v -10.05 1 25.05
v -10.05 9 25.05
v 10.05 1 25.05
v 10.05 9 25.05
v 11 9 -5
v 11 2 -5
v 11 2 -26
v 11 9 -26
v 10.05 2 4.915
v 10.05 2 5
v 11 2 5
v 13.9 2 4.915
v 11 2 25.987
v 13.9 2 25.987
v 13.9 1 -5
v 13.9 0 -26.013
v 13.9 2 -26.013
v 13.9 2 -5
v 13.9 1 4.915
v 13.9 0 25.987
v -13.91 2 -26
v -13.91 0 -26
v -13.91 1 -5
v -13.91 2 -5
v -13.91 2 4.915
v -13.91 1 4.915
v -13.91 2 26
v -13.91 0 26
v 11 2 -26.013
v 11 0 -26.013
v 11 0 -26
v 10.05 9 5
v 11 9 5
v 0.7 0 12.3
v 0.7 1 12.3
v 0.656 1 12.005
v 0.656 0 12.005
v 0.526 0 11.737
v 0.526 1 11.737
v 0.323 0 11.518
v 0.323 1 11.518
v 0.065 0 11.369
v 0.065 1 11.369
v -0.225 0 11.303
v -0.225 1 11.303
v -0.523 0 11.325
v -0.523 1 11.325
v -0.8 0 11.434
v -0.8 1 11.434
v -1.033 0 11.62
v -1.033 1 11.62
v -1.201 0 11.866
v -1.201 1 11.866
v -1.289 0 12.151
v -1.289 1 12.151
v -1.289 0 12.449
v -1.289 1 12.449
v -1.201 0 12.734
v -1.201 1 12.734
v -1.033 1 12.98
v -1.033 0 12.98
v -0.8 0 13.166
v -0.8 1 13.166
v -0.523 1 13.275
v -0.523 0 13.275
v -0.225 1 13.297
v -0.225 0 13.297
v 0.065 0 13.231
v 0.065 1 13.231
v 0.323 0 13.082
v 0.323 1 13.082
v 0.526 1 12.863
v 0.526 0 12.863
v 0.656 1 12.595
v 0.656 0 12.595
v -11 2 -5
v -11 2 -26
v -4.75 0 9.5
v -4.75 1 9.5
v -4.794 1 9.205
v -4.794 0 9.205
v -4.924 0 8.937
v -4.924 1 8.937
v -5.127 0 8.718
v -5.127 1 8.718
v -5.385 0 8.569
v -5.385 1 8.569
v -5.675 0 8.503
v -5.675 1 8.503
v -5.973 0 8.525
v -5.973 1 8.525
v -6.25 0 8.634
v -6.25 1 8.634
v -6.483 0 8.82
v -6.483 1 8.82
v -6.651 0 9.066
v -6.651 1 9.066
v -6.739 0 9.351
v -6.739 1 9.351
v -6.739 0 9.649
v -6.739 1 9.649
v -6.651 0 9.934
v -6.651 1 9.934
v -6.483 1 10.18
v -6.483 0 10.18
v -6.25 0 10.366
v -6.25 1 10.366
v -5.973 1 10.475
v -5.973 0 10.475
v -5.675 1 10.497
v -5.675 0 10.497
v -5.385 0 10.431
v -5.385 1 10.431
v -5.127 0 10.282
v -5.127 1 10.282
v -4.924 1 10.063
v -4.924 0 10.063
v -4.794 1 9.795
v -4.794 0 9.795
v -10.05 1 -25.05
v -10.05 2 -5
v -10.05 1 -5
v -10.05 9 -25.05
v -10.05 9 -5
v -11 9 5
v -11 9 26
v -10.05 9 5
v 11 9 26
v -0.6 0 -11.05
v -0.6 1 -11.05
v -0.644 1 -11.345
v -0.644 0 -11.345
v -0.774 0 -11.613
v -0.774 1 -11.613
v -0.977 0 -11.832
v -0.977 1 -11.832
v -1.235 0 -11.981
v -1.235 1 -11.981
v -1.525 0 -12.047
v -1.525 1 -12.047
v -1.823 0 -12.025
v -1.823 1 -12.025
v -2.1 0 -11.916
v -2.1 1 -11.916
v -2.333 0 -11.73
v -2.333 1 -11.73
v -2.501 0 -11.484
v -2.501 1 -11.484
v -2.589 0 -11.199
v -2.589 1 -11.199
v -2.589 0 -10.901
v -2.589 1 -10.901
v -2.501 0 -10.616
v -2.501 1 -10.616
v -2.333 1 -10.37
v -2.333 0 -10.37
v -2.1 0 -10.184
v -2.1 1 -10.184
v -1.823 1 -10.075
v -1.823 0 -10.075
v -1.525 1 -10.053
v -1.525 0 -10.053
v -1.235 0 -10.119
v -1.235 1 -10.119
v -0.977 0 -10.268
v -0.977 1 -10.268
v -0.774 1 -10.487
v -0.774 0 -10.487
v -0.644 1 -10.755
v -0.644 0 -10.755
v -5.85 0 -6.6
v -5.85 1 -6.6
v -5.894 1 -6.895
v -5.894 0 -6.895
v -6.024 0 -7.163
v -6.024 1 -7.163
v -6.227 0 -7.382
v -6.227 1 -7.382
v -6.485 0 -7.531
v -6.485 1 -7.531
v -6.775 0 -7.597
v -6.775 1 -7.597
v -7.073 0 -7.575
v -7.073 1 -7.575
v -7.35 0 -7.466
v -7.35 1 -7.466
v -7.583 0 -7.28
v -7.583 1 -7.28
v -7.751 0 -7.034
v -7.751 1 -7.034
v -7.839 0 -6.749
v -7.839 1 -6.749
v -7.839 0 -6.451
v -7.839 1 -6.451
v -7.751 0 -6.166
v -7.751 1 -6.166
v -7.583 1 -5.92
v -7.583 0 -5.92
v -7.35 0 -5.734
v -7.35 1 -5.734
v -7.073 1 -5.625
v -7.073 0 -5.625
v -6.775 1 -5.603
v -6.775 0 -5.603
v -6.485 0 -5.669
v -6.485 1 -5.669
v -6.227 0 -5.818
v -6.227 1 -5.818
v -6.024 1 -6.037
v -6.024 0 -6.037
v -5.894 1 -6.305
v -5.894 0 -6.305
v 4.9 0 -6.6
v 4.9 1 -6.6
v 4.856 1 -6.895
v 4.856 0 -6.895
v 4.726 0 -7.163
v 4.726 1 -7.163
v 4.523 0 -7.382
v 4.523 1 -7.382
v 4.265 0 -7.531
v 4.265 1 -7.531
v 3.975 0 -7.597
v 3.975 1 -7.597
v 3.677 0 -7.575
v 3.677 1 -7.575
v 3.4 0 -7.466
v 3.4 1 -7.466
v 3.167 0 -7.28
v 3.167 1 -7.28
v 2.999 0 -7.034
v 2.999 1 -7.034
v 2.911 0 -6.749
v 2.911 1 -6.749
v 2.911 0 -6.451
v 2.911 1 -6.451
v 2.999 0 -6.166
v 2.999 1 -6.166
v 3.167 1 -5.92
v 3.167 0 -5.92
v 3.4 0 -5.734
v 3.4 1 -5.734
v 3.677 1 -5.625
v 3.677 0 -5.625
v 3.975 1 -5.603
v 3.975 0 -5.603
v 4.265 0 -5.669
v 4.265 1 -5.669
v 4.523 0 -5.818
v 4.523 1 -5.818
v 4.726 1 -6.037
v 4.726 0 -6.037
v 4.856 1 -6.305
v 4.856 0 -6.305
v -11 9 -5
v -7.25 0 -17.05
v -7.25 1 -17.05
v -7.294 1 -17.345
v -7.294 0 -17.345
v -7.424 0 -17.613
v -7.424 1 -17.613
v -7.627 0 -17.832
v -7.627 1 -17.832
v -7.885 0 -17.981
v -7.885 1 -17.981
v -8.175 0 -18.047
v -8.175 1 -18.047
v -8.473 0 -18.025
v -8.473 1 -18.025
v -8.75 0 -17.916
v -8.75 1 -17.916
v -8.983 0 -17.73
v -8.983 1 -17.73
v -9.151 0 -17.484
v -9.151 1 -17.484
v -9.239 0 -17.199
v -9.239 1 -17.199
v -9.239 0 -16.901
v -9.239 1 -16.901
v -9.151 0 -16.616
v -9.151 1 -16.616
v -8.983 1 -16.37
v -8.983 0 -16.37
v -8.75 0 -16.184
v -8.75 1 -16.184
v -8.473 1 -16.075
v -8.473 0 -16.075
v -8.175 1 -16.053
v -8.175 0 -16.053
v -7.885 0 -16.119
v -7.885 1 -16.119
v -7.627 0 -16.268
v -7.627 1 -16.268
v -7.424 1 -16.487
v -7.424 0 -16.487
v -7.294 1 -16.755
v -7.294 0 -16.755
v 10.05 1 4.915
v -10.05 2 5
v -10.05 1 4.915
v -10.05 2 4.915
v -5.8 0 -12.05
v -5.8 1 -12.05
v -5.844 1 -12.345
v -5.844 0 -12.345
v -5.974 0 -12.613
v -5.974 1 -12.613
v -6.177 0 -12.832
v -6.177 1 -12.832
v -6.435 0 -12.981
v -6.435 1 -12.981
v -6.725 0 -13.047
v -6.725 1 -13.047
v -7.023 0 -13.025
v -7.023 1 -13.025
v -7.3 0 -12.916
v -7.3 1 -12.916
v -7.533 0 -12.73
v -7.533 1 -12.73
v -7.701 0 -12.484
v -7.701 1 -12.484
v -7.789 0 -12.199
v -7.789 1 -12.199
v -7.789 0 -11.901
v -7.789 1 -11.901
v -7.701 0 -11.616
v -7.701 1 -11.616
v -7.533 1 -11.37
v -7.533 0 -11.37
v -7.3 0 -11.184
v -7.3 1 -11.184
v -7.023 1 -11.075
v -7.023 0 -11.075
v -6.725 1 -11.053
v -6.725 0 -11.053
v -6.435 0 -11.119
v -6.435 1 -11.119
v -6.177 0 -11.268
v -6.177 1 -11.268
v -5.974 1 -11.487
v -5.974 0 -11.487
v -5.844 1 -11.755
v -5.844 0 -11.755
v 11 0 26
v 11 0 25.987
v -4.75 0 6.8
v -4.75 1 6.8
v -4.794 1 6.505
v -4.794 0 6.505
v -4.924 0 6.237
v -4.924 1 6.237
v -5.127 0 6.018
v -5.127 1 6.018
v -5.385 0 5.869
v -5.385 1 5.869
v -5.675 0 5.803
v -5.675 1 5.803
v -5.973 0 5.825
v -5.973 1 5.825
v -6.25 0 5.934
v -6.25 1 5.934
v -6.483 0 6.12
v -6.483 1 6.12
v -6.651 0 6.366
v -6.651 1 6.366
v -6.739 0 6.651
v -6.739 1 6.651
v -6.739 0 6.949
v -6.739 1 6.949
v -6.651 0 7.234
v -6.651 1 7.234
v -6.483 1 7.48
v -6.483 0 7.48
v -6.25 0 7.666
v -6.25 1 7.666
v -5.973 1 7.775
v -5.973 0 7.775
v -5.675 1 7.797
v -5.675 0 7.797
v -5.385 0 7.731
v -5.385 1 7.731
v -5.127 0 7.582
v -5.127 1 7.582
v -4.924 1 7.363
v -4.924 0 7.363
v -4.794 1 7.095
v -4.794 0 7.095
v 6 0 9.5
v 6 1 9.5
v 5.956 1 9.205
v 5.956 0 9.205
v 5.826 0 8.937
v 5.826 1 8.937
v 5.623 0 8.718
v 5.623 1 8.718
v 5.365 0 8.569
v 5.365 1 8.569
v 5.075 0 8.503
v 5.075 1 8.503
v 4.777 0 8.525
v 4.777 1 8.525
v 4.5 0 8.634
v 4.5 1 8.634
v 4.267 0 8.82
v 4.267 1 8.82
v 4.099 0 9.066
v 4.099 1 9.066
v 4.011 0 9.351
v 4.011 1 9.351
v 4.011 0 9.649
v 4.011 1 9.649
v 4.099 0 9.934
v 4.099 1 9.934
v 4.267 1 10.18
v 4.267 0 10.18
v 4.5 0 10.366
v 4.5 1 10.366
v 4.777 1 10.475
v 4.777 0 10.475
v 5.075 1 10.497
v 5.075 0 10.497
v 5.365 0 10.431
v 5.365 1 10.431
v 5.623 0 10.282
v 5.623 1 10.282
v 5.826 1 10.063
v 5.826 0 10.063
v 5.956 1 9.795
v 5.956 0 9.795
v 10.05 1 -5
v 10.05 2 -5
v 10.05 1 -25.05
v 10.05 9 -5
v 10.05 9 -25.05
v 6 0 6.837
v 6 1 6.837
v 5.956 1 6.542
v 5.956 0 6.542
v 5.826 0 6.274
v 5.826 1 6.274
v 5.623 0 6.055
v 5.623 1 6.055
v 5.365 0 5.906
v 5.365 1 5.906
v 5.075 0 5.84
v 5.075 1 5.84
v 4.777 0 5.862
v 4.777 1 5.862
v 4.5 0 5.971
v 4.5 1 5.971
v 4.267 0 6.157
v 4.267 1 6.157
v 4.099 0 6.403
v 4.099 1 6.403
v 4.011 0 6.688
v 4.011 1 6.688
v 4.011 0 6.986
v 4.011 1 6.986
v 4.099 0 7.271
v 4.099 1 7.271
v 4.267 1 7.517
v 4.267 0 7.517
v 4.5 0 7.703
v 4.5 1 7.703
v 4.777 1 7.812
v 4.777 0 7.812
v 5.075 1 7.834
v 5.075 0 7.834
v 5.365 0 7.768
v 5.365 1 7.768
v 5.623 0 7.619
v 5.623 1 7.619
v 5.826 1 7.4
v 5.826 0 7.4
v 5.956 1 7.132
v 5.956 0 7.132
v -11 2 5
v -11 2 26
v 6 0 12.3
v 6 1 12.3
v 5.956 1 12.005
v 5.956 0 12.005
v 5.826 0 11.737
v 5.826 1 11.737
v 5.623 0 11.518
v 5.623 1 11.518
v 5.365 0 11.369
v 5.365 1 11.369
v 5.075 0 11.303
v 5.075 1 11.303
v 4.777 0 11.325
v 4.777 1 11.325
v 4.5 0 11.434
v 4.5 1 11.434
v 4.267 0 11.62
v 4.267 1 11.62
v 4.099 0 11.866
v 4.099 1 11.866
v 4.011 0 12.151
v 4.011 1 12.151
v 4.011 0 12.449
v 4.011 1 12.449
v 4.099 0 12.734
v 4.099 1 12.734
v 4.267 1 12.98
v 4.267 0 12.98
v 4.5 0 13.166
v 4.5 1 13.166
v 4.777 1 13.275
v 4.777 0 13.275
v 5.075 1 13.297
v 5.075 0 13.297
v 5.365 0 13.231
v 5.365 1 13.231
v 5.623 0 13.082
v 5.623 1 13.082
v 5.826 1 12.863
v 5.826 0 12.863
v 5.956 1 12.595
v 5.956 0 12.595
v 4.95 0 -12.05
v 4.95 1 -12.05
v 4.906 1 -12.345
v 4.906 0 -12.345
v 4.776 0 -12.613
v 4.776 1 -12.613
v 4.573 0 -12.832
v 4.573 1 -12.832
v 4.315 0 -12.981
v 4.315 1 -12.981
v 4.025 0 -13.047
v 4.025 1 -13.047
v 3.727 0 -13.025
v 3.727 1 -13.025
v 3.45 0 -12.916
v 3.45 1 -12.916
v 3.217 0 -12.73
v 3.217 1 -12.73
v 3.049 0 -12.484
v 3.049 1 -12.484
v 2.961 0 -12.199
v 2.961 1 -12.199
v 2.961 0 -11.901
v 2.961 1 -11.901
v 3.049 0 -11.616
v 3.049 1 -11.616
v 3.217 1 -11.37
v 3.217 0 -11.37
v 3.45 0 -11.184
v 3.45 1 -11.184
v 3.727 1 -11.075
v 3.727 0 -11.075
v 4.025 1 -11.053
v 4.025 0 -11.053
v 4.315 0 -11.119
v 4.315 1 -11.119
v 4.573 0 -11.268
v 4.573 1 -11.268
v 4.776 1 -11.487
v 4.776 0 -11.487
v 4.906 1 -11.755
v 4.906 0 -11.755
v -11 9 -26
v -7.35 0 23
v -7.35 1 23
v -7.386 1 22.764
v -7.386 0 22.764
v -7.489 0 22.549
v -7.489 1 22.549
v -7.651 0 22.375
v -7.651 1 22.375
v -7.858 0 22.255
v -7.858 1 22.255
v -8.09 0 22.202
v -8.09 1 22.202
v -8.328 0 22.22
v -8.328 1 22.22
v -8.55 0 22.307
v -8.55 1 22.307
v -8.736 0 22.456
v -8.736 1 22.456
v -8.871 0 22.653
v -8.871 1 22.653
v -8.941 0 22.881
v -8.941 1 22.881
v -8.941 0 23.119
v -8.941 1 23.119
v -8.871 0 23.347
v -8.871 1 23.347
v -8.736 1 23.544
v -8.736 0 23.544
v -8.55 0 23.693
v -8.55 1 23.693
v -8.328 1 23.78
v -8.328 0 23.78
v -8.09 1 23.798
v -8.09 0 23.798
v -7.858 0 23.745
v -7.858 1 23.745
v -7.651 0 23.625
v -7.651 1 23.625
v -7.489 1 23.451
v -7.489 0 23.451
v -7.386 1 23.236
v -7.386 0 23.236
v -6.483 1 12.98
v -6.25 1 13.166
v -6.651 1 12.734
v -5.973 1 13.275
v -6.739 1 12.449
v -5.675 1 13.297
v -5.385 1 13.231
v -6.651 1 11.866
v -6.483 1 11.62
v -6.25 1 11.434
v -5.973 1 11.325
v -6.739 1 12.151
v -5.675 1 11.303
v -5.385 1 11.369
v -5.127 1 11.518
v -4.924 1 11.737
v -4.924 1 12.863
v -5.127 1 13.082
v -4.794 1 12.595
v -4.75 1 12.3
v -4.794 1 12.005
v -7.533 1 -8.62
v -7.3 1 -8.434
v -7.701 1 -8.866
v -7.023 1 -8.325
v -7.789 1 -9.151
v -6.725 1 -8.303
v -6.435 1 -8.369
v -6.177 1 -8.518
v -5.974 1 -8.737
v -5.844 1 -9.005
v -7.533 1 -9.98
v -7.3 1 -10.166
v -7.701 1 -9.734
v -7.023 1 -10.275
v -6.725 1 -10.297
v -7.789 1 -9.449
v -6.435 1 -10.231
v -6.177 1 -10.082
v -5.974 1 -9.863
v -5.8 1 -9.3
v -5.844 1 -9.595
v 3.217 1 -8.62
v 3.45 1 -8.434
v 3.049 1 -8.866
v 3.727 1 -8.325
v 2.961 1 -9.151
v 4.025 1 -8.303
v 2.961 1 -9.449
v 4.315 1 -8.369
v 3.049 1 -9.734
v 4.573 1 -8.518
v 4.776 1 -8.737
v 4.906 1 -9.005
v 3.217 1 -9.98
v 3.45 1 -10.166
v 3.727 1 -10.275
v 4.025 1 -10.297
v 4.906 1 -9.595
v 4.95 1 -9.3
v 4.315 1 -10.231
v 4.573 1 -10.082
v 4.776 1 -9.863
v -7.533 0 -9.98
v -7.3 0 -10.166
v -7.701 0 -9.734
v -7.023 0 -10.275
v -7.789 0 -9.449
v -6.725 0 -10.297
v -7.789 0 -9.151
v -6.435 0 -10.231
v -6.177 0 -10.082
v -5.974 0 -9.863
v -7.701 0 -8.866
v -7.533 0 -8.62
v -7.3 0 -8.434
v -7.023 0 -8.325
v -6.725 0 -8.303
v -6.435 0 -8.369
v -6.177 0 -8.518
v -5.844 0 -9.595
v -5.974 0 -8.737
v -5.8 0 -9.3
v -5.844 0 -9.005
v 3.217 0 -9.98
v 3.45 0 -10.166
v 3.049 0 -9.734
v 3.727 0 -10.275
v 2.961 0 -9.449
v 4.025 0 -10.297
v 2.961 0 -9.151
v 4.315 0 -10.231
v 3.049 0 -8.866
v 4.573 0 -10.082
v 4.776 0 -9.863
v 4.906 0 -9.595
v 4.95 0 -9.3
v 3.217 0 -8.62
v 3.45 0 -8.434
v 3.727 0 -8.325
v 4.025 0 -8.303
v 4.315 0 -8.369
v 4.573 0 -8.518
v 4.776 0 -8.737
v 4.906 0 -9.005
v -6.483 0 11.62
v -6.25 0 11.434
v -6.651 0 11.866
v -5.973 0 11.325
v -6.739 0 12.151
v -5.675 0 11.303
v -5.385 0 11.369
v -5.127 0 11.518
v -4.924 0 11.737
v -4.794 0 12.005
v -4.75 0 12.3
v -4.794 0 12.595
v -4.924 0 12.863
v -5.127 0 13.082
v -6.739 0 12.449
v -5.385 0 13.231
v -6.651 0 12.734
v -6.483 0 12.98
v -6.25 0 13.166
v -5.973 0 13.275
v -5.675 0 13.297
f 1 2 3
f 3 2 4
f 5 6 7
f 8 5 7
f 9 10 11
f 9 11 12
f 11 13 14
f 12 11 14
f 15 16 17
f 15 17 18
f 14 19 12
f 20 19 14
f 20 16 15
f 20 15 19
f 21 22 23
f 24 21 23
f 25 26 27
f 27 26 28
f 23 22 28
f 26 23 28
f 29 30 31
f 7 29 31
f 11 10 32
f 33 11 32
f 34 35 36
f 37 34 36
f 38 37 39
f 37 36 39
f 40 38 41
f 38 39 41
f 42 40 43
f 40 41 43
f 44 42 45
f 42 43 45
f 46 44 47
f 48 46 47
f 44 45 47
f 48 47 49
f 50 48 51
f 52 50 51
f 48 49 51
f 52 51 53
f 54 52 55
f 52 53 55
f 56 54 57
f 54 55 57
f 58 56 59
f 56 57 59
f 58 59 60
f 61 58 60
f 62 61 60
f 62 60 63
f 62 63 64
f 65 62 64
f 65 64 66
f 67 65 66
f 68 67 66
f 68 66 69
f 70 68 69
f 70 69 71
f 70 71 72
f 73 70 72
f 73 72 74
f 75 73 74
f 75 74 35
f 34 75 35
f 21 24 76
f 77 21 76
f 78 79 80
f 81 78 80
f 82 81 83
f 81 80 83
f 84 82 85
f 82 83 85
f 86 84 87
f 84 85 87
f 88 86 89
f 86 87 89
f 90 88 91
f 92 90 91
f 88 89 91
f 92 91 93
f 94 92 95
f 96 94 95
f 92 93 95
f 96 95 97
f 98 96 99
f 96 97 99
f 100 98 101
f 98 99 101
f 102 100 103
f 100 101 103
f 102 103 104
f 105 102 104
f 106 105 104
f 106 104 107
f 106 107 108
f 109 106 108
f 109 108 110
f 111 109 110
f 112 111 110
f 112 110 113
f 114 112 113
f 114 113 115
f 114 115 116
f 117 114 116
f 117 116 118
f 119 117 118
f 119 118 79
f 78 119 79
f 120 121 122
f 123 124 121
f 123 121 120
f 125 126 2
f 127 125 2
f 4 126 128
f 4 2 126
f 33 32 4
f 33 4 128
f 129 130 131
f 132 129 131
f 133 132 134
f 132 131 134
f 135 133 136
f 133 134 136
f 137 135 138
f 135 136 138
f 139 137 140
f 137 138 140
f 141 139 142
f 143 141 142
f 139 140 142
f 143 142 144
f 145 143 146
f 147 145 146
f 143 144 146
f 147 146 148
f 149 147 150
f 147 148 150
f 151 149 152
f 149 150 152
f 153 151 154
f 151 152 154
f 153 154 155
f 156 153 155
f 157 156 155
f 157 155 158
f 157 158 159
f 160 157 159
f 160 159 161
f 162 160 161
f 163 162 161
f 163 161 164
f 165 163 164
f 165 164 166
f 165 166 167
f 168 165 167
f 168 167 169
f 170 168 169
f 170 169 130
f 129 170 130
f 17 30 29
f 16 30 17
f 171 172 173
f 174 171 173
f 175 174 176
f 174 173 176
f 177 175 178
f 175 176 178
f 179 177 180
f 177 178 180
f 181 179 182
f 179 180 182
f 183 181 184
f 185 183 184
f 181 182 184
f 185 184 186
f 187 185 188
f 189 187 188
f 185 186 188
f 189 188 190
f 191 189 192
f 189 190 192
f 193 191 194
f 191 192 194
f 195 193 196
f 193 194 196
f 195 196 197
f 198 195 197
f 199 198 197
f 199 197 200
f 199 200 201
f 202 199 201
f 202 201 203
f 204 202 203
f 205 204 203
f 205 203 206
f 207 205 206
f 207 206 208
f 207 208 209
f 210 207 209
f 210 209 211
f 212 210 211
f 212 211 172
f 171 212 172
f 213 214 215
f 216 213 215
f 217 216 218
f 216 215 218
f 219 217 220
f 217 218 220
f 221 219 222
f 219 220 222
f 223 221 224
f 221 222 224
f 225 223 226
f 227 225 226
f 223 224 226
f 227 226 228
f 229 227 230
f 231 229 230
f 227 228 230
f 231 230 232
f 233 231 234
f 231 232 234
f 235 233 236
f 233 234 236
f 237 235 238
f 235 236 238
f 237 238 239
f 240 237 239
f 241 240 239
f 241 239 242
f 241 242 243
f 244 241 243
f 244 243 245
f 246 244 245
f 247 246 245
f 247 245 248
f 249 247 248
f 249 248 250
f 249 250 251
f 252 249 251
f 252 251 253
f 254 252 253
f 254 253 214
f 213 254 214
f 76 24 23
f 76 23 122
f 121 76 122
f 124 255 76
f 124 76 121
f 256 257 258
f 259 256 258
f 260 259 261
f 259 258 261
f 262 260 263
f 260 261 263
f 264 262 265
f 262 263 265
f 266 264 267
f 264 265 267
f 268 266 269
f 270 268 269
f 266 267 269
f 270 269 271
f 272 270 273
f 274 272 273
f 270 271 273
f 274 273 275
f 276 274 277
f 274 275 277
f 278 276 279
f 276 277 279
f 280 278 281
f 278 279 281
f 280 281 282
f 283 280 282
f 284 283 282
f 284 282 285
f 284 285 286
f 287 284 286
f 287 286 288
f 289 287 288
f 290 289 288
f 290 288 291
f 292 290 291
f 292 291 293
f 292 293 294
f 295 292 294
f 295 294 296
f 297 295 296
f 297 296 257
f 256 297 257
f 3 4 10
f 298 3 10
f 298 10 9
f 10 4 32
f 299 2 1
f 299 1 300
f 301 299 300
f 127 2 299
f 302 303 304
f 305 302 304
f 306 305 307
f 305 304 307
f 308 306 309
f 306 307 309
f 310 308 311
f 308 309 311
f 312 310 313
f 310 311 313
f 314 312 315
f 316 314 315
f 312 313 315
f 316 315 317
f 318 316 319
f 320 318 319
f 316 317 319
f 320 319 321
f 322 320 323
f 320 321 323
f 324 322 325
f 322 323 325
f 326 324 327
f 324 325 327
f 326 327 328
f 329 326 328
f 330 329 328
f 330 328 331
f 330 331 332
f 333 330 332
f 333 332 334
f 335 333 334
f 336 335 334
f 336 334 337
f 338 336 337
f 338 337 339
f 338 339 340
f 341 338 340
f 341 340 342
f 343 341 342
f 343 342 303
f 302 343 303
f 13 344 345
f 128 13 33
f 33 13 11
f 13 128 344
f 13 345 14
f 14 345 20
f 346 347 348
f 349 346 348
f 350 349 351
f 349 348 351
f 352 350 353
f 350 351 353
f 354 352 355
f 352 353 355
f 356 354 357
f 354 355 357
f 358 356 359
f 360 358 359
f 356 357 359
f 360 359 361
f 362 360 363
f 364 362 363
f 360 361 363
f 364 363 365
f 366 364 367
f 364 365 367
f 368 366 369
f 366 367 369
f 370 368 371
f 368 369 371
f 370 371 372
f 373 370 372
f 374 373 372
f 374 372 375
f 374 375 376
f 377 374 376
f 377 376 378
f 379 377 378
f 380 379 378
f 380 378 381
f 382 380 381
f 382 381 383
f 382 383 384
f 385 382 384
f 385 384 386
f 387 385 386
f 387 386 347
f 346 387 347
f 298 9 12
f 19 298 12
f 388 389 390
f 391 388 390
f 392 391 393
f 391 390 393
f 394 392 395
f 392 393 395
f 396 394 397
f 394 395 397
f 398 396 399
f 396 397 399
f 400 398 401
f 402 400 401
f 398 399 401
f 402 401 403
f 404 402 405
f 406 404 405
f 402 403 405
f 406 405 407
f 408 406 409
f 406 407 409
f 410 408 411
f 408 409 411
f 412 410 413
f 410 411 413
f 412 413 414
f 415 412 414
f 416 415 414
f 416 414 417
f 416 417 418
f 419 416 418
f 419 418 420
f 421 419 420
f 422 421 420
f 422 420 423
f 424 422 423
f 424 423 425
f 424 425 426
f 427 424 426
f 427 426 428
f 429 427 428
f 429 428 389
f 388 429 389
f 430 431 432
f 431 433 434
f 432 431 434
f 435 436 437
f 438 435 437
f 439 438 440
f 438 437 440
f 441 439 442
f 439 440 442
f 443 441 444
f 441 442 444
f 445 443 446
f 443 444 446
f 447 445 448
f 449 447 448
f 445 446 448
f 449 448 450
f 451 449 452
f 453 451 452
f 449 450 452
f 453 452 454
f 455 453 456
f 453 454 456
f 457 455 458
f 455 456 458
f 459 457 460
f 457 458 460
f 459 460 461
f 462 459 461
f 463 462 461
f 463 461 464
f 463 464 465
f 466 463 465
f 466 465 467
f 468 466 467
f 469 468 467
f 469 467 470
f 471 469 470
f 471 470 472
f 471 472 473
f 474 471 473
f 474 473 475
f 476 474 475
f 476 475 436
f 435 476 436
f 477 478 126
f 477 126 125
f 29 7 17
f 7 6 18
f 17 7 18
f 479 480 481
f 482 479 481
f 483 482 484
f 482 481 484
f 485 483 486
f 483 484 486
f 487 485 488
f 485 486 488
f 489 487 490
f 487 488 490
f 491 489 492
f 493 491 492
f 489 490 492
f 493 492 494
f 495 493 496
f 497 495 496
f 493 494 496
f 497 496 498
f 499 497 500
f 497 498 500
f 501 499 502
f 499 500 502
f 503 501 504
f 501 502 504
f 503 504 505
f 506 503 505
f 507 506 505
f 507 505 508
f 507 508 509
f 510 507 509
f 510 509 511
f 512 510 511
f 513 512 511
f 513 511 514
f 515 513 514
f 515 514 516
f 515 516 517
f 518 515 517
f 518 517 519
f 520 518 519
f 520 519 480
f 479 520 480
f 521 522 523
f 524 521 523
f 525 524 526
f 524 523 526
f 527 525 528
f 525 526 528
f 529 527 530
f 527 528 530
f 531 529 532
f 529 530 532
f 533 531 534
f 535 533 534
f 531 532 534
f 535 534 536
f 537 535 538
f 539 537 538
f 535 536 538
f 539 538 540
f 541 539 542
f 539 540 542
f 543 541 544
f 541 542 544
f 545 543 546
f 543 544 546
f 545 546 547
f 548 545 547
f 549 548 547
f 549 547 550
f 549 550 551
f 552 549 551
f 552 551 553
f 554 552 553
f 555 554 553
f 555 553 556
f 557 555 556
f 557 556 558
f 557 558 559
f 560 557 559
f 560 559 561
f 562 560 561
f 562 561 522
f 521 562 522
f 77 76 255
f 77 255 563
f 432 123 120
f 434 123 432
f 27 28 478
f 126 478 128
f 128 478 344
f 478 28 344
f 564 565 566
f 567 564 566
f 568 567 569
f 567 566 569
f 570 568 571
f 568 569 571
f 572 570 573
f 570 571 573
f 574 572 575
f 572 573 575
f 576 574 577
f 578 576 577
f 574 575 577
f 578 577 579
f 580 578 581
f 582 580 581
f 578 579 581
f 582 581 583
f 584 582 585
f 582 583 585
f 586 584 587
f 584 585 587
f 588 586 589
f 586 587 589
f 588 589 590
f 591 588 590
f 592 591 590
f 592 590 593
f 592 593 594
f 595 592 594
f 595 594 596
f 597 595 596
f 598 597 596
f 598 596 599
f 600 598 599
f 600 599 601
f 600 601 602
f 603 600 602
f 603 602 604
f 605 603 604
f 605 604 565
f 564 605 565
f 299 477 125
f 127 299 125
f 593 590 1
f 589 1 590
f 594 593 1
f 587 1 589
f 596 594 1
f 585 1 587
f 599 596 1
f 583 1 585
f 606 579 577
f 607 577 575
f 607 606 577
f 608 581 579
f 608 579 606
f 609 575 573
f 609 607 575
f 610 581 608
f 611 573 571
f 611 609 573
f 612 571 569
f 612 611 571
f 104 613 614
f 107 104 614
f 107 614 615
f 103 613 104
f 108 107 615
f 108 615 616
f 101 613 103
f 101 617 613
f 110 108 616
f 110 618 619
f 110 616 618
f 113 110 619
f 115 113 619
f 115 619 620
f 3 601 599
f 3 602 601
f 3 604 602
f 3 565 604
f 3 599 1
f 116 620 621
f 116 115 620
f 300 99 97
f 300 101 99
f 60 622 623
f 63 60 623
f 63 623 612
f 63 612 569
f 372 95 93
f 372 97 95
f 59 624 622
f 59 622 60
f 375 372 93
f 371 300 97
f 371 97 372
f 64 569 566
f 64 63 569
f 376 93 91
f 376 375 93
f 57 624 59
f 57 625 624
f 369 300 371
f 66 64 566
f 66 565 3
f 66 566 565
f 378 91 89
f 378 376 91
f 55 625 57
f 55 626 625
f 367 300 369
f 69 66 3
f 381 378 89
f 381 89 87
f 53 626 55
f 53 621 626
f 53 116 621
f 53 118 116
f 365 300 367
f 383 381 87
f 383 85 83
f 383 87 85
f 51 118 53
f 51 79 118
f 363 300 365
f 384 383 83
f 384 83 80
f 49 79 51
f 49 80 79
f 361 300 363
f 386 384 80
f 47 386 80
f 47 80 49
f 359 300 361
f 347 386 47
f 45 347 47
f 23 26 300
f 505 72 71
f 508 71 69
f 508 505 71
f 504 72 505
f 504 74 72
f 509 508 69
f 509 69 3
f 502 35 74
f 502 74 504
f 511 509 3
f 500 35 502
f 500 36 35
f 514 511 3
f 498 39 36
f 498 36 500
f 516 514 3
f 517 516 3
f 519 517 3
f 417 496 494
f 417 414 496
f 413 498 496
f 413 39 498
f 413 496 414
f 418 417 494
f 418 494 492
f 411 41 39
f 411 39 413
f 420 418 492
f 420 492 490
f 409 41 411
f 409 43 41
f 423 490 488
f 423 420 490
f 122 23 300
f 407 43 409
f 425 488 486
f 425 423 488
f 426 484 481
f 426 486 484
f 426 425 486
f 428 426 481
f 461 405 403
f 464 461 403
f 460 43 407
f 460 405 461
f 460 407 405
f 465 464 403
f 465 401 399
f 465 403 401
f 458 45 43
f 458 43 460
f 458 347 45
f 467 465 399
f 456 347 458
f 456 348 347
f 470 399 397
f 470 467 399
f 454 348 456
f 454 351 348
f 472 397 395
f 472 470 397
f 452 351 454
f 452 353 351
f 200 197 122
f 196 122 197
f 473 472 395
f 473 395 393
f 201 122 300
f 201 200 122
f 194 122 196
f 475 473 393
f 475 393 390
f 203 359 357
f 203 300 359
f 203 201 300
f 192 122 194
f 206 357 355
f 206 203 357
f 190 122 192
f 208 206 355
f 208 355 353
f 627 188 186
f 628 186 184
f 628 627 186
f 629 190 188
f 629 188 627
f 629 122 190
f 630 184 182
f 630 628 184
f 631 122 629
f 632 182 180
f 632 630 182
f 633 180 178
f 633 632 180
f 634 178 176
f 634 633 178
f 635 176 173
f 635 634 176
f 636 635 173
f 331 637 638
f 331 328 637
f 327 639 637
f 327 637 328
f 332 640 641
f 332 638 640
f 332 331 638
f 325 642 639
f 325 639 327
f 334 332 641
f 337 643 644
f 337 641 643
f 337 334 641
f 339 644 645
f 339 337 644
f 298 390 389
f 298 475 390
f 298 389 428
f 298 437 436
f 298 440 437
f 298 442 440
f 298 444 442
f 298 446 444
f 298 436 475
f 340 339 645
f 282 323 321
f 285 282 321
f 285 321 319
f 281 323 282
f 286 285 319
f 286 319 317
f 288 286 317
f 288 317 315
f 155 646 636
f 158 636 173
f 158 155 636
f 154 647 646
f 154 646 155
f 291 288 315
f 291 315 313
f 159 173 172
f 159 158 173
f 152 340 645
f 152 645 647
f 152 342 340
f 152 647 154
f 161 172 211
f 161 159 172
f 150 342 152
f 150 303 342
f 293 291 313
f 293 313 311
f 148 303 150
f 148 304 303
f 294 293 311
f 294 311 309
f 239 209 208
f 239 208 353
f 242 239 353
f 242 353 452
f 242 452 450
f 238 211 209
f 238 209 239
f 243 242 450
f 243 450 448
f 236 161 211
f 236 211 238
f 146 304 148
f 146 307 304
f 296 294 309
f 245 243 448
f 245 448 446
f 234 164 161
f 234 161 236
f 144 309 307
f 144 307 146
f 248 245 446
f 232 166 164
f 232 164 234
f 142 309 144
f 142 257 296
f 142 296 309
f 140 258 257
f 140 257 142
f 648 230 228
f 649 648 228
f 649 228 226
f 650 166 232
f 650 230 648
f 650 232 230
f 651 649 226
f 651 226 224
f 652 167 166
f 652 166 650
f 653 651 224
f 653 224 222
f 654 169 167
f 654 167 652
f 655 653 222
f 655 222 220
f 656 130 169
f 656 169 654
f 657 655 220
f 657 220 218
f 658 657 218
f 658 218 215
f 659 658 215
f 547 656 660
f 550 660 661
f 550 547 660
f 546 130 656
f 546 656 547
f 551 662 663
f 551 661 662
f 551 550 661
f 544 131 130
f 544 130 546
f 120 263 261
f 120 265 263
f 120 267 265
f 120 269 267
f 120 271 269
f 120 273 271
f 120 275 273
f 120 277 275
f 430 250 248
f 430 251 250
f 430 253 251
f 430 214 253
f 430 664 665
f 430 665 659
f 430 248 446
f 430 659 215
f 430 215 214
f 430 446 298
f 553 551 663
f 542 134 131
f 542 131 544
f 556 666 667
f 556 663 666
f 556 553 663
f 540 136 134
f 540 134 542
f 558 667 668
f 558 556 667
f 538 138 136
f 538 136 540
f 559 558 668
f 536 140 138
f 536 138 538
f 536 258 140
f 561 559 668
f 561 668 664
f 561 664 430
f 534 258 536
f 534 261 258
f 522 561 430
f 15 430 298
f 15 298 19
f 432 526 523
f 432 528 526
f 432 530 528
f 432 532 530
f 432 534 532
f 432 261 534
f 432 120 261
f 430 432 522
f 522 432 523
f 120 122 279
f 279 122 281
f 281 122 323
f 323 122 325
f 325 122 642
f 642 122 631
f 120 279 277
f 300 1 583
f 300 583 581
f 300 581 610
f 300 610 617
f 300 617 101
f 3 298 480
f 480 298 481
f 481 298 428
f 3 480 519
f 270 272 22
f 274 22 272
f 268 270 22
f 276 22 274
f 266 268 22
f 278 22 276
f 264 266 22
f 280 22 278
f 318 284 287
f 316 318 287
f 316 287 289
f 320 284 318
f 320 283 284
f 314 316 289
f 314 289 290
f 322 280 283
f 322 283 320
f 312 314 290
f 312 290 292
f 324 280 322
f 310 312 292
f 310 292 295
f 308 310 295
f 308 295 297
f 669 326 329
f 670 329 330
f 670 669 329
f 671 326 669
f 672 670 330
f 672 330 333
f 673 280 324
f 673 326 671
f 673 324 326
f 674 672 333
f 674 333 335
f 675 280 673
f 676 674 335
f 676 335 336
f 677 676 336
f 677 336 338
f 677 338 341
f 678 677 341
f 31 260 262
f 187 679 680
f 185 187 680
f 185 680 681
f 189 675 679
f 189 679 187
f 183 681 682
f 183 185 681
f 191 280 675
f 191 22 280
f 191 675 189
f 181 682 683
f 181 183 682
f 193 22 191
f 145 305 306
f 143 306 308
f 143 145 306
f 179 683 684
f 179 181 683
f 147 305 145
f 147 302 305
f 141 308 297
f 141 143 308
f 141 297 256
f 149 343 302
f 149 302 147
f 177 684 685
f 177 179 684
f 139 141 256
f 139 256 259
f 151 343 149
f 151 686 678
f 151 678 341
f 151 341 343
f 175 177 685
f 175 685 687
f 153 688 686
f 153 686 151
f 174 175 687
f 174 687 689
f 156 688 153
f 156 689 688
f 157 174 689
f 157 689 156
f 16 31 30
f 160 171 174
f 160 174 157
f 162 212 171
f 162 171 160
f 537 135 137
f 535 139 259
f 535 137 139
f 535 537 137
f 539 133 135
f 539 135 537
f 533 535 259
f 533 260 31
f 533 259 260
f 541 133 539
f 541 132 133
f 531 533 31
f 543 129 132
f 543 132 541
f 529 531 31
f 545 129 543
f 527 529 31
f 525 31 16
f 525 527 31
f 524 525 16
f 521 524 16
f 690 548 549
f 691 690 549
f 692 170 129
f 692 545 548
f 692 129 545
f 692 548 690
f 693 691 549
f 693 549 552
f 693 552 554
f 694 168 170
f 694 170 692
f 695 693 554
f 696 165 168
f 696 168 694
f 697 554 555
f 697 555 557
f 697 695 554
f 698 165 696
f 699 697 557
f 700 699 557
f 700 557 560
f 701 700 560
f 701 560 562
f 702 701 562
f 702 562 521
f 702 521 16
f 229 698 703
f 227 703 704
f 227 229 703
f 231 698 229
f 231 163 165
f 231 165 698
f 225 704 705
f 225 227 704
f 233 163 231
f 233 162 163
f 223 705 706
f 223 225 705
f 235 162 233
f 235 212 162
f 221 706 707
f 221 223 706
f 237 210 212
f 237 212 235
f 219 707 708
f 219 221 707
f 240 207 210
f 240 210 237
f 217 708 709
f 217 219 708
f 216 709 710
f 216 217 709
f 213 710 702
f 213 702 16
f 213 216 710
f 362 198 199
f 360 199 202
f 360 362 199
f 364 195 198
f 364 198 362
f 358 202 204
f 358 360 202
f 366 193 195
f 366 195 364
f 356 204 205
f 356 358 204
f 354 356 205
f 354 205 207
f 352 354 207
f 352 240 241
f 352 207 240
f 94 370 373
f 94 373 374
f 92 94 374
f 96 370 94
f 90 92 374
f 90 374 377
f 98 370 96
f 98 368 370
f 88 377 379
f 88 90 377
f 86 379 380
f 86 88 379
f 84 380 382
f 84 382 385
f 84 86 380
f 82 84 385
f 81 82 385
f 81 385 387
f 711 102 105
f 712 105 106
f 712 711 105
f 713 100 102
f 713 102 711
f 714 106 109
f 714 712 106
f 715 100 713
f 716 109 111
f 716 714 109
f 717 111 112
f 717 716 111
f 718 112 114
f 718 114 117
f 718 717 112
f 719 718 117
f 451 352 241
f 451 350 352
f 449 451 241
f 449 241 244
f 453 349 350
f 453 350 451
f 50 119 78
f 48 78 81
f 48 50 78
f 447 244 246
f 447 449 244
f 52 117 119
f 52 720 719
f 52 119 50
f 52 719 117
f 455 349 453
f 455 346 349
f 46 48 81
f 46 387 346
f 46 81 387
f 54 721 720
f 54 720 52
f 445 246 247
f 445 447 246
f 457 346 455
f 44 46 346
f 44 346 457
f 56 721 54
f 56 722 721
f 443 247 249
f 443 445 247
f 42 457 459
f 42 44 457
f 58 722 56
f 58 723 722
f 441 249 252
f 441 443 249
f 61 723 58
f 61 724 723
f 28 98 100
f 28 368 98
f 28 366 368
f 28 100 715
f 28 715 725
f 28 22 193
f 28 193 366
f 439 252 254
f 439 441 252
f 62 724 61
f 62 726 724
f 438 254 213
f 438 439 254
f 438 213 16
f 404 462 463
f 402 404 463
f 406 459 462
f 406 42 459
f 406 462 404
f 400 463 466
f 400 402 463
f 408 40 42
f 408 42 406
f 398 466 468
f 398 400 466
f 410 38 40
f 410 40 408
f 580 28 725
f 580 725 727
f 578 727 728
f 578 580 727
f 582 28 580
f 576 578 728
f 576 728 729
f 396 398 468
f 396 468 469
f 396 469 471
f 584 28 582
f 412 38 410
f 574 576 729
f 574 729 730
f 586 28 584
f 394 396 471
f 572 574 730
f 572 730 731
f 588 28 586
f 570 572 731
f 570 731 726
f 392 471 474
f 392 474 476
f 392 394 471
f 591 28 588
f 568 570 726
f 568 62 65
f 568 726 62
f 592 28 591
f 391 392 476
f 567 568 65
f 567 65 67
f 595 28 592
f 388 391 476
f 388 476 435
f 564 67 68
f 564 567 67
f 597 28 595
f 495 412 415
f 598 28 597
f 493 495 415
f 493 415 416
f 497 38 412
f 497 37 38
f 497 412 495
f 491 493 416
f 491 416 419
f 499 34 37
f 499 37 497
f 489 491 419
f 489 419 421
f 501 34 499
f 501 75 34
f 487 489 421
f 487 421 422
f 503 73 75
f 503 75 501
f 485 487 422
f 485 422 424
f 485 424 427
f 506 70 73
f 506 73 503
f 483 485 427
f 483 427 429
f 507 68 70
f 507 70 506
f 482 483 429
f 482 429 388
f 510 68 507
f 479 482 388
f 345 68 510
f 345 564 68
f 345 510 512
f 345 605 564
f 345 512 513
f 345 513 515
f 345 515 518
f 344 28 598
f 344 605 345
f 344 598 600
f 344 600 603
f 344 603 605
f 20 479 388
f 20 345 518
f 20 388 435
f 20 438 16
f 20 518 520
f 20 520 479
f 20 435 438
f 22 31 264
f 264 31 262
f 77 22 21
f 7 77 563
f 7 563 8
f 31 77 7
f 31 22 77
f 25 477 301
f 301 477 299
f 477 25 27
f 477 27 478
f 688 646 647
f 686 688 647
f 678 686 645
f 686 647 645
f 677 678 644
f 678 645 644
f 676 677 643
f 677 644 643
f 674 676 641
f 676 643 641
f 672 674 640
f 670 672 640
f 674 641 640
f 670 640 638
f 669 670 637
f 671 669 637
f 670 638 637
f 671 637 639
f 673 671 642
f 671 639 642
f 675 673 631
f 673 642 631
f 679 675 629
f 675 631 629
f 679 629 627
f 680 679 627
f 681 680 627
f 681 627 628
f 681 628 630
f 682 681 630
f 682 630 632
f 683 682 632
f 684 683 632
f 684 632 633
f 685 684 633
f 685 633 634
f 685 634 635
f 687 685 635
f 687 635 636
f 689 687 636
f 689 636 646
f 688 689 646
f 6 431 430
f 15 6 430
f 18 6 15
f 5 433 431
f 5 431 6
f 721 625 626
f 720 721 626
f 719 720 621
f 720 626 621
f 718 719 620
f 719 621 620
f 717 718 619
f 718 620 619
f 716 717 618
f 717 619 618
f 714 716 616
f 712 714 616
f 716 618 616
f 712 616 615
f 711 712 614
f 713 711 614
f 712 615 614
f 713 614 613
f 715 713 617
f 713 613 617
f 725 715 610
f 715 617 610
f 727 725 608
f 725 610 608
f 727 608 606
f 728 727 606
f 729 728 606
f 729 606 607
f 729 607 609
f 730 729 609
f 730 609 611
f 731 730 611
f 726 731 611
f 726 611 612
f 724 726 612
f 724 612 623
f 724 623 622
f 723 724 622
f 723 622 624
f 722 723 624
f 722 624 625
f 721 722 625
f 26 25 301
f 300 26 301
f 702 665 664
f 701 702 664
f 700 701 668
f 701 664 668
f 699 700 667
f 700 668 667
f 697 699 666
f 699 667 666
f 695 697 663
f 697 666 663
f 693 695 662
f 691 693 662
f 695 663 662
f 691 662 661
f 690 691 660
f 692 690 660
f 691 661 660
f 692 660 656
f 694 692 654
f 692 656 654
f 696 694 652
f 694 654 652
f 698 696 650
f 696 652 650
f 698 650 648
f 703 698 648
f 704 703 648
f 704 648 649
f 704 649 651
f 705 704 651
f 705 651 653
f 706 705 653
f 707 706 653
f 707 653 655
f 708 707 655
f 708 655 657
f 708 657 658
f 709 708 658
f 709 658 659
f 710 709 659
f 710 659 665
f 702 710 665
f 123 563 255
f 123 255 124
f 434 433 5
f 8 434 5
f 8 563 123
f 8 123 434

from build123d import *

# Parameters (mm, degrees)
SKETCH1_W               = 22
SKETCH1_H               = 52
BOSS_EXTRUDE1_DEPTH     = 9
CUT_EXTRUDE1_START      = 2
SKETCH2_W               = 20.1
SKETCH2_H               = 50.1
CUT_EXTRUDE1_DEPTH      = 10
SKETCH7_R               = 0.8
CUT_EXTRUDE6_DEPTH      = 9
CUT_EXTRUDE6_DEPTH_BACK = 2
CUT_EXTRUDE7_REACH      = 3
SKETCH8_R               = 1
CUT_EXTRUDE9_REACH      = 3
SKETCH9_R               = 1
CUT_EXTRUDE10_REACH     = 3
SKETCH10_R              = 1
CUT_EXTRUDE11_REACH     = 3
SKETCH11_R              = 1
CUT_EXTRUDE12_REACH     = 3
SKETCH12_R              = 1
CUT_EXTRUDE13_REACH     = 3
SKETCH13_R              = 1
CUT_EXTRUDE14_REACH     = 3
SKETCH14_R              = 1
CUT_EXTRUDE15_REACH     = 3
SKETCH15_R              = 1
CUT_EXTRUDE16_REACH     = 3
SKETCH16_R              = 1
SKETCH18_W              = 2.91
SKETCH18_H              = 52
BOSS_EXTRUDE2_DEPTH     = 2
SKETCH18_3_W            = 2.9
SKETCH18_3_H            = 52
BOSS_EXTRUDE3_DEPTH     = 2
SKETCH19_W              = 10
SKETCH19_H              = 7
CUT_EXTRUDE17_DEPTH     = 25.9
SKETCH20_W              = 3.86
SKETCH20_H              = 9.915252407
SKETCH20_W_2            = 4.307713093
CUT_EXTRUDE18_DEPTH     = 1


with BuildPart() as part:
    # Sketch1 → Boss-Extrude1 (new body)
    with BuildSketch(Plane(origin=(0, 0, 0), x_dir=(1, 0, 0), z_dir=(0, 1, 0))):
        Rectangle(SKETCH1_W, SKETCH1_H)
    extrude(amount=BOSS_EXTRUDE1_DEPTH)

    # Sketch2 → Cut-Extrude1 (cut)
    with BuildSketch(Plane(origin=(0, 9, 0), x_dir=(1, 0, 0), z_dir=(0, 1, 0)).offset(CUT_EXTRUDE1_START)):
        Rectangle(SKETCH2_W, SKETCH2_H)
    extrude(amount=-CUT_EXTRUDE1_DEPTH, mode=Mode.SUBTRACT)

    # Sketch7 → Cut-Extrude6 (cut, two sides)
    with BuildSketch(Plane(origin=(0, 1, 0), x_dir=(1, 0, 0), z_dir=(0, 1, 0))) as cut_extrude6_sk:
        with Locations((-8.15, -23)):
            Circle(SKETCH7_R)
    extrude(amount=CUT_EXTRUDE6_DEPTH, mode=Mode.SUBTRACT)
    extrude(cut_extrude6_sk.sketch, amount=-CUT_EXTRUDE6_DEPTH_BACK, mode=Mode.SUBTRACT)

    # Sketch8 → Cut-Extrude7 (cut, up to next)
    with BuildSketch(Plane(origin=(0, 1, 0), x_dir=(1, 0, 0), z_dir=(0, 1, 0)), mode=Mode.PRIVATE) as cut_extrude7_sk1:
        with Locations((-5.75, -12.3)):
            Circle(SKETCH8_R)
    cut_extrude7_tool1 = extrude(cut_extrude7_sk1.sketch, amount=-CUT_EXTRUDE7_REACH, mode=Mode.PRIVATE) & part.part
    add(cut_extrude7_tool1.solids().sort_by_distance((-5.75, 1, 12.3))[0], mode=Mode.SUBTRACT)
    # Sketch8 → Cut-Extrude7 (cut, up to next)
    with BuildSketch(Plane(origin=(0, 1, 0), x_dir=(1, 0, 0), z_dir=(0, 1, 0)), mode=Mode.PRIVATE) as cut_extrude7_sk2:
        with Locations((5, -12.3)):
            Circle(SKETCH8_R)
    cut_extrude7_tool2 = extrude(cut_extrude7_sk2.sketch, amount=-CUT_EXTRUDE7_REACH, mode=Mode.PRIVATE) & part.part
    add(cut_extrude7_tool2.solids().sort_by_distance((5, 1, 12.3))[0], mode=Mode.SUBTRACT)

    # Sketch9 → Cut-Extrude9 (cut, up to next)
    with BuildSketch(Plane(origin=(0, 1, 0), x_dir=(1, 0, 0), z_dir=(0, 1, 0)), mode=Mode.PRIVATE) as cut_extrude9_sk1:
        with Locations((-5.75, -9.5)):
            Circle(SKETCH9_R)
    cut_extrude9_tool1 = extrude(cut_extrude9_sk1.sketch, amount=-CUT_EXTRUDE9_REACH, mode=Mode.PRIVATE) & part.part
    add(cut_extrude9_tool1.solids().sort_by_distance((-5.75, 1, 9.5))[0], mode=Mode.SUBTRACT)
    # Sketch9 → Cut-Extrude9 (cut, up to next)
    with BuildSketch(Plane(origin=(0, 1, 0), x_dir=(1, 0, 0), z_dir=(0, 1, 0)), mode=Mode.PRIVATE) as cut_extrude9_sk2:
        with Locations((5, -9.5)):
            Circle(SKETCH9_R)
    cut_extrude9_tool2 = extrude(cut_extrude9_sk2.sketch, amount=-CUT_EXTRUDE9_REACH, mode=Mode.PRIVATE) & part.part
    add(cut_extrude9_tool2.solids().sort_by_distance((5, 1, 9.5))[0], mode=Mode.SUBTRACT)

    # Sketch10 → Cut-Extrude10 (cut, up to next)
    with BuildSketch(Plane(origin=(0, 1, 0), x_dir=(1, 0, 0), z_dir=(0, 1, 0)), mode=Mode.PRIVATE) as cut_extrude10_sk1:
        with Locations((-5.75, -6.8)):
            Circle(SKETCH10_R)
    cut_extrude10_tool1 = extrude(cut_extrude10_sk1.sketch, amount=-CUT_EXTRUDE10_REACH, mode=Mode.PRIVATE) & part.part
    add(cut_extrude10_tool1.solids().sort_by_distance((-5.75, 1, 6.8))[0], mode=Mode.SUBTRACT)
    # Sketch10 → Cut-Extrude10 (cut, up to next)
    with BuildSketch(Plane(origin=(0, 1, 0), x_dir=(1, 0, 0), z_dir=(0, 1, 0)), mode=Mode.PRIVATE) as cut_extrude10_sk2:
        with Locations((5, -6.837159935)):
            Circle(SKETCH10_R)
    cut_extrude10_tool2 = extrude(cut_extrude10_sk2.sketch, amount=-CUT_EXTRUDE10_REACH, mode=Mode.PRIVATE) & part.part
    add(cut_extrude10_tool2.solids().sort_by_distance((5, 1, 6.83716))[0], mode=Mode.SUBTRACT)

    # Sketch11 → Cut-Extrude11 (cut, up to next)
    with BuildSketch(Plane(origin=(0, 1, 0), x_dir=(1, 0, 0), z_dir=(0, 1, 0)), mode=Mode.PRIVATE) as cut_extrude11_sk1:
        with Locations((-0.3, -12.3)):
            Circle(SKETCH11_R)
    cut_extrude11_tool1 = extrude(cut_extrude11_sk1.sketch, amount=-CUT_EXTRUDE11_REACH, mode=Mode.PRIVATE) & part.part
    add(cut_extrude11_tool1.solids().sort_by_distance((-0.3, 1, 12.3))[0], mode=Mode.SUBTRACT)

    # Sketch12 → Cut-Extrude12 (cut, up to next)
    with BuildSketch(Plane(origin=(0, 1, 0), x_dir=(1, 0, 0), z_dir=(0, 1, 0)), mode=Mode.PRIVATE) as cut_extrude12_sk1:
        with Locations((3.95, 12.05)):
            Circle(SKETCH12_R)
    cut_extrude12_tool1 = extrude(cut_extrude12_sk1.sketch, amount=-CUT_EXTRUDE12_REACH, mode=Mode.PRIVATE) & part.part
    add(cut_extrude12_tool1.solids().sort_by_distance((3.95, 1, -12.05))[0], mode=Mode.SUBTRACT)
    # Sketch12 → Cut-Extrude12 (cut, up to next)
    with BuildSketch(Plane(origin=(0, 1, 0), x_dir=(1, 0, 0), z_dir=(0, 1, 0)), mode=Mode.PRIVATE) as cut_extrude12_sk2:
        with Locations((-6.8, 12.05)):
            Circle(SKETCH12_R)
    cut_extrude12_tool2 = extrude(cut_extrude12_sk2.sketch, amount=-CUT_EXTRUDE12_REACH, mode=Mode.PRIVATE) & part.part
    add(cut_extrude12_tool2.solids().sort_by_distance((-6.8, 1, -12.05))[0], mode=Mode.SUBTRACT)

    # Sketch13 → Cut-Extrude13 (cut, up to next)
    with BuildSketch(Plane(origin=(0, 1, 0), x_dir=(1, 0, 0), z_dir=(0, 1, 0)), mode=Mode.PRIVATE) as cut_extrude13_sk1:
        with Locations((3.95, 9.3)):
            Circle(SKETCH13_R)
    cut_extrude13_tool1 = extrude(cut_extrude13_sk1.sketch, amount=-CUT_EXTRUDE13_REACH, mode=Mode.PRIVATE) & part.part
    add(cut_extrude13_tool1.solids().sort_by_distance((3.95, 1, -9.3))[0], mode=Mode.SUBTRACT)
    # Sketch13 → Cut-Extrude13 (cut, up to next)
    with BuildSketch(Plane(origin=(0, 1, 0), x_dir=(1, 0, 0), z_dir=(0, 1, 0)), mode=Mode.PRIVATE) as cut_extrude13_sk2:
        with Locations((-6.8, 9.3)):
            Circle(SKETCH13_R)
    cut_extrude13_tool2 = extrude(cut_extrude13_sk2.sketch, amount=-CUT_EXTRUDE13_REACH, mode=Mode.PRIVATE) & part.part
    add(cut_extrude13_tool2.solids().sort_by_distance((-6.8, 1, -9.3))[0], mode=Mode.SUBTRACT)

    # Sketch14 → Cut-Extrude14 (cut, up to next)
    with BuildSketch(Plane(origin=(0, 1, 0), x_dir=(1, 0, 0), z_dir=(0, 1, 0)), mode=Mode.PRIVATE) as cut_extrude14_sk1:
        with Locations((3.9, 6.6)):
            Circle(SKETCH14_R)
    cut_extrude14_tool1 = extrude(cut_extrude14_sk1.sketch, amount=-CUT_EXTRUDE14_REACH, mode=Mode.PRIVATE) & part.part
    add(cut_extrude14_tool1.solids().sort_by_distance((3.9, 1, -6.6))[0], mode=Mode.SUBTRACT)
    # Sketch14 → Cut-Extrude14 (cut, up to next)
    with BuildSketch(Plane(origin=(0, 1, 0), x_dir=(1, 0, 0), z_dir=(0, 1, 0)), mode=Mode.PRIVATE) as cut_extrude14_sk2:
        with Locations((-6.85, 6.6)):
            Circle(SKETCH14_R)
    cut_extrude14_tool2 = extrude(cut_extrude14_sk2.sketch, amount=-CUT_EXTRUDE14_REACH, mode=Mode.PRIVATE) & part.part
    add(cut_extrude14_tool2.solids().sort_by_distance((-6.85, 1, -6.6))[0], mode=Mode.SUBTRACT)

    # Sketch15 → Cut-Extrude15 (cut, up to next)
    with BuildSketch(Plane(origin=(0, 1, 0), x_dir=(1, 0, 0), z_dir=(0, 1, 0)), mode=Mode.PRIVATE) as cut_extrude15_sk1:
        with Locations((-1.6, 11.05)):
            Circle(SKETCH15_R)
    cut_extrude15_tool1 = extrude(cut_extrude15_sk1.sketch, amount=-CUT_EXTRUDE15_REACH, mode=Mode.PRIVATE) & part.part
    add(cut_extrude15_tool1.solids().sort_by_distance((-1.6, 1, -11.05))[0], mode=Mode.SUBTRACT)

    # Sketch16 → Cut-Extrude16 (cut, up to next)
    with BuildSketch(Plane(origin=(0, 1, 0), x_dir=(1, 0, 0), z_dir=(0, 1, 0)), mode=Mode.PRIVATE) as cut_extrude16_sk1:
        with Locations((-8.25, 17.05)):
            Circle(SKETCH16_R)
    cut_extrude16_tool1 = extrude(cut_extrude16_sk1.sketch, amount=-CUT_EXTRUDE16_REACH, mode=Mode.PRIVATE) & part.part
    add(cut_extrude16_tool1.solids().sort_by_distance((-8.25, 1, -17.05))[0], mode=Mode.SUBTRACT)

    # Sketch18 → Boss-Extrude2 (add)
    with BuildSketch(Plane.XZ):
        with Locations((-12.455, 0)):
            Rectangle(SKETCH18_W, SKETCH18_H)
    extrude(amount=-BOSS_EXTRUDE2_DEPTH)

    # Sketch18<3> → Boss-Extrude3 (add)
    with BuildSketch(Plane.XZ):
        with Locations((12.45, -0.012983648)):
            Rectangle(SKETCH18_3_W, SKETCH18_3_H)
    extrude(amount=-BOSS_EXTRUDE3_DEPTH)

    # Sketch19 → Cut-Extrude17 (cut, through all)
    with BuildSketch(Plane.ZY.offset(11)):
        with Locations((0, 5.5)):
            Rectangle(SKETCH19_W, SKETCH19_H)
    extrude(amount=-CUT_EXTRUDE17_DEPTH, mode=Mode.SUBTRACT)

    # Sketch20 → Cut-Extrude18 (cut)
    with BuildSketch(Plane(origin=(0, 2, 0), x_dir=(1, 0, 0), z_dir=(0, 1, 0))):
        with Locations((-11.98, 0.042373796)):
            Rectangle(SKETCH20_W, SKETCH20_H)
        with Locations((12.203856547, 0.042373796)):
            Rectangle(SKETCH20_W_2, SKETCH20_H)
    extrude(amount=-CUT_EXTRUDE18_DEPTH, mode=Mode.SUBTRACT)


solid = part.part
